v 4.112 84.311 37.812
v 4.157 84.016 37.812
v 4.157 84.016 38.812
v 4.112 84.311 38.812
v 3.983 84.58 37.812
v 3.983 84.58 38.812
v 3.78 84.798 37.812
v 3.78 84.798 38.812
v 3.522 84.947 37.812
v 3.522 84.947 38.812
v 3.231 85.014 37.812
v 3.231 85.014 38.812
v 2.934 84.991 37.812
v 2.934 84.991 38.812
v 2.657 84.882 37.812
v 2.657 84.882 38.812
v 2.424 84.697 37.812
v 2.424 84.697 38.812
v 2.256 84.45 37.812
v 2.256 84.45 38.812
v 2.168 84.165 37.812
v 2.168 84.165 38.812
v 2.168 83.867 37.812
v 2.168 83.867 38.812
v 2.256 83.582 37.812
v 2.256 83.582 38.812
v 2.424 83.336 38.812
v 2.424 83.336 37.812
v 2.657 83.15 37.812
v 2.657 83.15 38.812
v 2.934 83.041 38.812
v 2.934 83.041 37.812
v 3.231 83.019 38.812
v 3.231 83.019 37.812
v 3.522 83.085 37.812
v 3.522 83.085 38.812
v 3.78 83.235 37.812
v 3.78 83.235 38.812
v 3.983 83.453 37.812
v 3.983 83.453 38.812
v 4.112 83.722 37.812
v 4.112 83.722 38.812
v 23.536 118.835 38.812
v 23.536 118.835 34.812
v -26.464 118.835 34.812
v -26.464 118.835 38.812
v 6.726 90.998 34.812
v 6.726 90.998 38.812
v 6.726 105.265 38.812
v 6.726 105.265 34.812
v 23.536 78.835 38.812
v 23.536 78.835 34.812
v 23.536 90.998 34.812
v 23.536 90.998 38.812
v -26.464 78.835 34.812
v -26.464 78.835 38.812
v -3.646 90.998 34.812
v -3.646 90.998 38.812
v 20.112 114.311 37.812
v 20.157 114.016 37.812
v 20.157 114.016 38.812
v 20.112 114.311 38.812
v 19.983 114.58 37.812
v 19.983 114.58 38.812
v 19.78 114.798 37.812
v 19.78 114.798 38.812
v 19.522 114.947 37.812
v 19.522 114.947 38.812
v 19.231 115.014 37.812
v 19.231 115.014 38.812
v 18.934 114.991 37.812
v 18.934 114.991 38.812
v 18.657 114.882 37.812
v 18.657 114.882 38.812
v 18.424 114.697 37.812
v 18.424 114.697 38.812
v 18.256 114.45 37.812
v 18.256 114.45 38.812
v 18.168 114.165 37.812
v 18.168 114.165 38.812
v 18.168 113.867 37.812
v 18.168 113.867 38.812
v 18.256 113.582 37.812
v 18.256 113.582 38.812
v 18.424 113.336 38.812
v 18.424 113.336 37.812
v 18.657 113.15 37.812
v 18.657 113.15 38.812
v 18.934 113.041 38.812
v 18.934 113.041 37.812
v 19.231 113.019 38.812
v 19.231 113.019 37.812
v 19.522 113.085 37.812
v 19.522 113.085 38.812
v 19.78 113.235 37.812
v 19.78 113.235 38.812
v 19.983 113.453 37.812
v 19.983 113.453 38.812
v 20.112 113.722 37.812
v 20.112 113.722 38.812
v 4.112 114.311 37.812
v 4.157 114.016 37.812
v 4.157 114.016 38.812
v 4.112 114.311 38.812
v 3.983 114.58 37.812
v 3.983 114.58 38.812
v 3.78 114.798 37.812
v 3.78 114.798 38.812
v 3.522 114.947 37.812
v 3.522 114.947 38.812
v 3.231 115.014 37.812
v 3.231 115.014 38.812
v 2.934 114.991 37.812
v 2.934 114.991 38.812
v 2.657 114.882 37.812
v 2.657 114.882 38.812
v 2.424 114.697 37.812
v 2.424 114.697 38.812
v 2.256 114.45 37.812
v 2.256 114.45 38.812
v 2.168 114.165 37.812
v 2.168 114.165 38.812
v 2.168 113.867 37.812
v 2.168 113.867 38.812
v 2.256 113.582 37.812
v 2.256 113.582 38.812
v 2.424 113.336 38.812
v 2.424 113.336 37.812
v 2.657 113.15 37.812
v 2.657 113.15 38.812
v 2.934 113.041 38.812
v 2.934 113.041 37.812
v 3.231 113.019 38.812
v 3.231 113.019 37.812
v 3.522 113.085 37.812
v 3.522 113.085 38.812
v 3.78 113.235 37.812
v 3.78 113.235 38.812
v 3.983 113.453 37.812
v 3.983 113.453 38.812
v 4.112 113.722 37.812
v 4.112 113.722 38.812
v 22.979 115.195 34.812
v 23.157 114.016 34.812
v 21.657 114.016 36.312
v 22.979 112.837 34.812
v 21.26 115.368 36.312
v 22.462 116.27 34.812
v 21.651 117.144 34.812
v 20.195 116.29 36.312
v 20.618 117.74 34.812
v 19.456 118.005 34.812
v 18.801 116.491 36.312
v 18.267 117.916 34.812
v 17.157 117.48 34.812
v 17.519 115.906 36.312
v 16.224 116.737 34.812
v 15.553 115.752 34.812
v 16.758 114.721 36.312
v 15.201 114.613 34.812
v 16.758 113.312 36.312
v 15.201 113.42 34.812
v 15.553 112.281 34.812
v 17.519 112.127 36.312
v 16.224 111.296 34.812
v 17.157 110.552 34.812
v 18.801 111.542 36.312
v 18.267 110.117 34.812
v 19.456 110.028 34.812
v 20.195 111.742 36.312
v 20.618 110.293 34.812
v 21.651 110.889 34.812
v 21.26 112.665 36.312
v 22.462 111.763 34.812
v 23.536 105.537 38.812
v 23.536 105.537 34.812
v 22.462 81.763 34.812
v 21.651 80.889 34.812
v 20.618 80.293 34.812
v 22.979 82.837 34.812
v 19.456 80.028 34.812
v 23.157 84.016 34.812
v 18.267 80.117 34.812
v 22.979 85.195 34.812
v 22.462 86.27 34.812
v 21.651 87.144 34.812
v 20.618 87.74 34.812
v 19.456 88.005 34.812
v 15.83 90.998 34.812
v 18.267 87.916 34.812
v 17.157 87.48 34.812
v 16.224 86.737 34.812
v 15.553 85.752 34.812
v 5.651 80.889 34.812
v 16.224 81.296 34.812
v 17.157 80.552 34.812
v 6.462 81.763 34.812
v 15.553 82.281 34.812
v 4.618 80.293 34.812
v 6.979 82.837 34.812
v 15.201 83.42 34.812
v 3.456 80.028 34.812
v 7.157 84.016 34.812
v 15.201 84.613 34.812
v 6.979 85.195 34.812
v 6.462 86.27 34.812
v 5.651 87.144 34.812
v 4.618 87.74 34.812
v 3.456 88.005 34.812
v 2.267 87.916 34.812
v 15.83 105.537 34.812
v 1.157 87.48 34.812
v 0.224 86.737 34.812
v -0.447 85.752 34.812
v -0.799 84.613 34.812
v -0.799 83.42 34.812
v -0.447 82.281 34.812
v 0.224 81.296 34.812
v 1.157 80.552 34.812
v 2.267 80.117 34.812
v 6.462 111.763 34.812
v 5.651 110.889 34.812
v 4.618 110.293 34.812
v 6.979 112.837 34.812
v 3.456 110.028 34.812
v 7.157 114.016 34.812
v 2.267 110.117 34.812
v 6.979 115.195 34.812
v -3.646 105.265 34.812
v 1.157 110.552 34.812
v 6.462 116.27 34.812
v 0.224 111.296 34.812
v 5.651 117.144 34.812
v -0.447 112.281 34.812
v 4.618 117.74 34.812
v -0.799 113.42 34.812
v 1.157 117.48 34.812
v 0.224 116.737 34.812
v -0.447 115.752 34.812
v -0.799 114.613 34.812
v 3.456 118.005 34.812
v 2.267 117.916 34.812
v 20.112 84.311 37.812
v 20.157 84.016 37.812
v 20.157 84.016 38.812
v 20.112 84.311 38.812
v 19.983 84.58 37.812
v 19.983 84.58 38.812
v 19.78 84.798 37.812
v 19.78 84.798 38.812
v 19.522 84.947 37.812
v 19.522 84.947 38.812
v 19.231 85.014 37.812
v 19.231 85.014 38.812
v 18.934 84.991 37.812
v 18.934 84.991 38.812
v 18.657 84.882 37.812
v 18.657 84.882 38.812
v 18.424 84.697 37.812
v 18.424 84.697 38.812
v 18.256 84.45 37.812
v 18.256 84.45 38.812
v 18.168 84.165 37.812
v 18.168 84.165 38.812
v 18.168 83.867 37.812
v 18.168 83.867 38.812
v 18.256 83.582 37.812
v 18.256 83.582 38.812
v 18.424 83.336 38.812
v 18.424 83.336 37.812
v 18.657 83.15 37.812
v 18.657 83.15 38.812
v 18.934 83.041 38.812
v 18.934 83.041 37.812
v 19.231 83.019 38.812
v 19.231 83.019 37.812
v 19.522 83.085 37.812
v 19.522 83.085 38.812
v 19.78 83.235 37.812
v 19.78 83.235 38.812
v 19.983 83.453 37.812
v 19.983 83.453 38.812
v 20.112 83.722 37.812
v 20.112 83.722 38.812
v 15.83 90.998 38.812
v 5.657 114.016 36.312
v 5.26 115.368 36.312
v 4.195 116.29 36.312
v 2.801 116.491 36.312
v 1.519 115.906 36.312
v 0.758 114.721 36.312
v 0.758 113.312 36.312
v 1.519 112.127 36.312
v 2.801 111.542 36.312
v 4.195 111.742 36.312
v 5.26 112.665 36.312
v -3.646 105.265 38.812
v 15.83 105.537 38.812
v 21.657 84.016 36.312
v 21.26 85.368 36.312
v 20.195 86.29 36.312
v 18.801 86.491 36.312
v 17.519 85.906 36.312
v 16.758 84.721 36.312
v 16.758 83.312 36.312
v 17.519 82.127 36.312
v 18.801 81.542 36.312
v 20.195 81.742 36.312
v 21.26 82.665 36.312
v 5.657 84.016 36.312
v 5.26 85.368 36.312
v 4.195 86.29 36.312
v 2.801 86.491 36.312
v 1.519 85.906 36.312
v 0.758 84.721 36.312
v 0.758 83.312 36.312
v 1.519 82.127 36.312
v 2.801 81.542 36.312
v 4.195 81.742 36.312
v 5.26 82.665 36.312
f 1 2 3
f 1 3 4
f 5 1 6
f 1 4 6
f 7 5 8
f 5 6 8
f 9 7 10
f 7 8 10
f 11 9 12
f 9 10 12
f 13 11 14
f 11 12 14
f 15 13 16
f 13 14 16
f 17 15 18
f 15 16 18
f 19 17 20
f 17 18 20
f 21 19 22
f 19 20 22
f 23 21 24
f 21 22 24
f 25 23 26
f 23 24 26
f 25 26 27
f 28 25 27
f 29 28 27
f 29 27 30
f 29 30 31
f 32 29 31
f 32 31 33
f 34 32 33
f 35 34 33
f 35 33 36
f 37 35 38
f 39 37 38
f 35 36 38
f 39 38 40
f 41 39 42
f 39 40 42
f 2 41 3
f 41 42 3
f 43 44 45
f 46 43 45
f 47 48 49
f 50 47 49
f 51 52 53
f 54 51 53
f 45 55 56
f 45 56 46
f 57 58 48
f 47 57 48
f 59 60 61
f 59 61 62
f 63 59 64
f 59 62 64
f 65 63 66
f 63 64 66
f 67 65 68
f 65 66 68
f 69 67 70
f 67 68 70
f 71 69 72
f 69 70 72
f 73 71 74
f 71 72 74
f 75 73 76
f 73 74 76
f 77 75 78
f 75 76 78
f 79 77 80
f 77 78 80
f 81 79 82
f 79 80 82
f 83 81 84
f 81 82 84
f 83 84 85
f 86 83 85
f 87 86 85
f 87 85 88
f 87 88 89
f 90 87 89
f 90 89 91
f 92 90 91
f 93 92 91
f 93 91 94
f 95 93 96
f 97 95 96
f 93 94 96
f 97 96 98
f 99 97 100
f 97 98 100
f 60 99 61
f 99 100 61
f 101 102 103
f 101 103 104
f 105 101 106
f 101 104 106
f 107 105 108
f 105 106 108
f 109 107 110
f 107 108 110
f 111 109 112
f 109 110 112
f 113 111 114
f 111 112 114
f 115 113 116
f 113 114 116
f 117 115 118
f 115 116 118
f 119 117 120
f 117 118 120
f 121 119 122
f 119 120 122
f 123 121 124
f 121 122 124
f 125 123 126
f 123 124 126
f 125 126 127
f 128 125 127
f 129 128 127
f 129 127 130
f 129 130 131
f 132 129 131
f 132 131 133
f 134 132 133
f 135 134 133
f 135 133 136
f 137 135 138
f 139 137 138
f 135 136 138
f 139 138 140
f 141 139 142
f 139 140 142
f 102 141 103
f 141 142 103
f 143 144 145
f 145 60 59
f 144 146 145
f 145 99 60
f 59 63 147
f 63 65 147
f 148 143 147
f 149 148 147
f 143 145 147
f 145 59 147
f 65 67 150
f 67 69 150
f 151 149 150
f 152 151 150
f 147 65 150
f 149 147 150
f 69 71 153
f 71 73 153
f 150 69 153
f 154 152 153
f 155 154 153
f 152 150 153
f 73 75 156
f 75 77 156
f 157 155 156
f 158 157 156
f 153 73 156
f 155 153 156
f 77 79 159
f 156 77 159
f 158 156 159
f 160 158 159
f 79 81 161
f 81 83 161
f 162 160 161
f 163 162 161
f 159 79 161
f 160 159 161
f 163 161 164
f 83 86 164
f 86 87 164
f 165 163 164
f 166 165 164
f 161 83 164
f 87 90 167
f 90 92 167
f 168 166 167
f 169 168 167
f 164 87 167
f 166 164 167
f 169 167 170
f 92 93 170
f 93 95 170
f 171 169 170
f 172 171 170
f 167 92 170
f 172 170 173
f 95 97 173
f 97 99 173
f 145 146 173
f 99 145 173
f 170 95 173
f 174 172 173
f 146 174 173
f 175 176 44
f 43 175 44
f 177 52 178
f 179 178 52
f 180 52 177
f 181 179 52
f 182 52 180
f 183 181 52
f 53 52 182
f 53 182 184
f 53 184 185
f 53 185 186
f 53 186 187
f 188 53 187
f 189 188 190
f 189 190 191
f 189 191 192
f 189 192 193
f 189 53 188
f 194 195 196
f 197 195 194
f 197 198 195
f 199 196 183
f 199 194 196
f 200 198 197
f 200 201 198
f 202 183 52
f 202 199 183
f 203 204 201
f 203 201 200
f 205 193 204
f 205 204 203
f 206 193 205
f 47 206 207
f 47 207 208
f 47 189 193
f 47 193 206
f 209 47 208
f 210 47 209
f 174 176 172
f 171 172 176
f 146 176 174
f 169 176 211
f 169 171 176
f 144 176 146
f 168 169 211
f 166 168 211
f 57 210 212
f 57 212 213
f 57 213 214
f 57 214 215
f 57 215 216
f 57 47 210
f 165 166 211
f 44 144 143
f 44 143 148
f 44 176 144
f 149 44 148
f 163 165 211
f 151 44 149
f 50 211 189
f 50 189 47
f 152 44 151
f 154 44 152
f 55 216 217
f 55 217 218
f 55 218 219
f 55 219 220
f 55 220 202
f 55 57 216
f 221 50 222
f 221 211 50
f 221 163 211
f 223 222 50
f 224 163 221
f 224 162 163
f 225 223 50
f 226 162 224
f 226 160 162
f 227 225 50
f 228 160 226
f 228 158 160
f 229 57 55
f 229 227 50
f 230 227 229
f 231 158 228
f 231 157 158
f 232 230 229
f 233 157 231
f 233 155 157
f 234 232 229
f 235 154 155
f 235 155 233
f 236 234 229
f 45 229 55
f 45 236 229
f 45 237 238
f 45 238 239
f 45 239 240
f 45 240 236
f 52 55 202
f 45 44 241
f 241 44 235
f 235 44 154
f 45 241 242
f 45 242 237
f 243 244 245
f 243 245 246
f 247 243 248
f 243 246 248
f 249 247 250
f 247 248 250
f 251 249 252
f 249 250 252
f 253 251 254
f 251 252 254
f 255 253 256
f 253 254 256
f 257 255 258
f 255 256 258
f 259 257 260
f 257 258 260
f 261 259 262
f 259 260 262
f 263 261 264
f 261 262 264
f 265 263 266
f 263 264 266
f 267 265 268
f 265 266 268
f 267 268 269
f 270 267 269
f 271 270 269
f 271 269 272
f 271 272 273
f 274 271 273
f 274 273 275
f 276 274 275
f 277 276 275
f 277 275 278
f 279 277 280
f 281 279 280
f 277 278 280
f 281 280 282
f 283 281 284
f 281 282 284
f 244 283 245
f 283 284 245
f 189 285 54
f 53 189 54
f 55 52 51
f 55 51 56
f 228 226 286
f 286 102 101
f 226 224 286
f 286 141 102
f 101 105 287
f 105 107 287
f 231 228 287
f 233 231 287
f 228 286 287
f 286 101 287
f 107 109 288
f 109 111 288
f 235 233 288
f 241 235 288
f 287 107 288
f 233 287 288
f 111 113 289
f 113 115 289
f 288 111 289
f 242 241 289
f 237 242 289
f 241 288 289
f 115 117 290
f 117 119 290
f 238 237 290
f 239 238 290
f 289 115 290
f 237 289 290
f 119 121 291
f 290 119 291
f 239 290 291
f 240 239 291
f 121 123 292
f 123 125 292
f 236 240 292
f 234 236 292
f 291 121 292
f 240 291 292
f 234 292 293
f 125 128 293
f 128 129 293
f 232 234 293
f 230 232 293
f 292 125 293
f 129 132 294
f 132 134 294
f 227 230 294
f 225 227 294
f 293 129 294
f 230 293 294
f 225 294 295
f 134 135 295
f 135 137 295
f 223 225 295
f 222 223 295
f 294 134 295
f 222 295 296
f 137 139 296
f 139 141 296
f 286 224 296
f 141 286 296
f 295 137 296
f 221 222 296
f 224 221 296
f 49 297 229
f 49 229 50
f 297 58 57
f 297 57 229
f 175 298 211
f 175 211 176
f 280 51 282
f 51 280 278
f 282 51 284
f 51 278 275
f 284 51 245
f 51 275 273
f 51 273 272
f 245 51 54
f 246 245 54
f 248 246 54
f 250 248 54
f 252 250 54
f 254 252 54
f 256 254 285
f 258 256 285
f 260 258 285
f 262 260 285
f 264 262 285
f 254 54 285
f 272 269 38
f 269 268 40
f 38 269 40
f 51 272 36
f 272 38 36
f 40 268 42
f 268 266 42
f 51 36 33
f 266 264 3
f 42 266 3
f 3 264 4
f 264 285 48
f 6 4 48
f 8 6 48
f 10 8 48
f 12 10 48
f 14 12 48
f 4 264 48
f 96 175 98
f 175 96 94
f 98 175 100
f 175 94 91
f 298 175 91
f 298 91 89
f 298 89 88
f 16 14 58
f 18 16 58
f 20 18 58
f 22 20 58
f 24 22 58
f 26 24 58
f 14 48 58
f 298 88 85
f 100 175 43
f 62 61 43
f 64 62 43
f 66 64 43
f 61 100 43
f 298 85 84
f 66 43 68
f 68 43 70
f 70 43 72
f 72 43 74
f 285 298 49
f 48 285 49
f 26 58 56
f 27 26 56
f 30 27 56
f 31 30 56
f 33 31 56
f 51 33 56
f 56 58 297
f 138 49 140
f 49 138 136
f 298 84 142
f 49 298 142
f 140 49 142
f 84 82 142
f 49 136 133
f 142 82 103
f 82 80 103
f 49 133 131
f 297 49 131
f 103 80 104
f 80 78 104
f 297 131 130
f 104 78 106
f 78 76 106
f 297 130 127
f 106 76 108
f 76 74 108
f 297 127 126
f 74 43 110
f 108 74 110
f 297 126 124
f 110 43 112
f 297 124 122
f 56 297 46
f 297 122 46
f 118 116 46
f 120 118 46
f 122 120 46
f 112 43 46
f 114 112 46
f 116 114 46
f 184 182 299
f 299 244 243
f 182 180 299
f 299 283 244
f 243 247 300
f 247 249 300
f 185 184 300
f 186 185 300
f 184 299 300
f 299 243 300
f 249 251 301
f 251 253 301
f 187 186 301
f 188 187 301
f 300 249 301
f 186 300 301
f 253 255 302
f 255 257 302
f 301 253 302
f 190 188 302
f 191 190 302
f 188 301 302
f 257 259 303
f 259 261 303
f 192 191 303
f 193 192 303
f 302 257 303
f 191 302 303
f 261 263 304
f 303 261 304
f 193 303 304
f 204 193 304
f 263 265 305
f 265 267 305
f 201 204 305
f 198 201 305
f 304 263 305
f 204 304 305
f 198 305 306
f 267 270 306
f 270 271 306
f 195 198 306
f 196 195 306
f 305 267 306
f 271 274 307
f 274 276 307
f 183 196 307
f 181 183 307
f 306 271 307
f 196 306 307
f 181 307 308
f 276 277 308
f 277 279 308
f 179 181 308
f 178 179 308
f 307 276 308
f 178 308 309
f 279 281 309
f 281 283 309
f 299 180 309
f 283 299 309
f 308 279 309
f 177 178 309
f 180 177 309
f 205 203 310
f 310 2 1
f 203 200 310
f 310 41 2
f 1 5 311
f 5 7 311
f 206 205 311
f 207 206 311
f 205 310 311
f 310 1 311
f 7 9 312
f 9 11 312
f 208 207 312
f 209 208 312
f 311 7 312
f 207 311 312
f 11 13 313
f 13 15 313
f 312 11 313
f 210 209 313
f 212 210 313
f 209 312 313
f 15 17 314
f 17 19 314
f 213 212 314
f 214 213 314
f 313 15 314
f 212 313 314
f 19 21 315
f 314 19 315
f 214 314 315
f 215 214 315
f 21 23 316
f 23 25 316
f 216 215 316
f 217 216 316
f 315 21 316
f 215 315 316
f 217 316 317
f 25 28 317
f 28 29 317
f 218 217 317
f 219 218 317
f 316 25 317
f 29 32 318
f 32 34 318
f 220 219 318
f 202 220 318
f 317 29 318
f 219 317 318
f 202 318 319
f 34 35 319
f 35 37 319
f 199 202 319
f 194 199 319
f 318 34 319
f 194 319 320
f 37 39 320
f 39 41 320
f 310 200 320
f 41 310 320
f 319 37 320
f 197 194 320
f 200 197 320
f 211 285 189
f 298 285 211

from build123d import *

# Parameters (mm, degrees)
SKETCH1_W                          = 50
SKETCH1_H                          = 40
BOSS_EXTRUDE1_DEPTH                = 4
SKETCH2_W                          = 7.705962758
SKETCH2_H                          = 14.539090136
CUT_EXTRUDE1_DEPTH                 = 122.811546491
SKETCH3_W                          = 10.372123492
SKETCH3_H                          = 14.267331442
CUT_EXTRUDE2_DEPTH                 = 122.811546491
F_2_0_2_DIAMETER_HOLE1_D           = 2
F_2_0_2_DIAMETER_HOLE1_CSINK_D     = 8
F_2_0_2_DIAMETER_HOLE1_CSINK_ANGLE = 90


with BuildPart() as part:
    # Sketch1 → Boss-Extrude1 (new body)
    with BuildSketch(Plane(origin=(0, 0, 34.811611197), x_dir=(-1, 0, 0), z_dir=(0, 0, -1))):
        with Locations((1.46446617, 98.834695645)):
            Rectangle(SKETCH1_W, SKETCH1_H)
    extrude(amount=-BOSS_EXTRUDE1_DEPTH)

    # Sketch2 → Cut-Extrude1 (cut, through all)
    with BuildSketch(Plane.XY.offset(38.811611197)):
        with Locations((19.682552451, 98.267628733)):
            Rectangle(SKETCH2_W, SKETCH2_H)
    extrude(amount=-CUT_EXTRUDE1_DEPTH, mode=Mode.SUBTRACT)

    # Sketch3 → Cut-Extrude2 (cut, through all)
    with BuildSketch(Plane.XY.offset(38.811611197)):
        with Locations((1.539593072, 98.131749386)):
            Rectangle(SKETCH3_W, SKETCH3_H)
    extrude(amount=-CUT_EXTRUDE2_DEPTH, mode=Mode.SUBTRACT)

    # Ø2.0 (2) Diameter Hole1 (through all)
    with Locations(Plane(origin=(0, 0, 34.811611197), x_dir=(-1, 0, 0), z_dir=(0, 0, -1))):
        with Locations((-3.156646479, 84.016340669), (-19.156646479, 84.016340669), (-19.156646479, 114.016340669), (-3.156646479, 114.016340669)):
            CounterSinkHole(F_2_0_2_DIAMETER_HOLE1_D / 2, F_2_0_2_DIAMETER_HOLE1_CSINK_D / 2, counter_sink_angle=F_2_0_2_DIAMETER_HOLE1_CSINK_ANGLE)


solid = part.part
